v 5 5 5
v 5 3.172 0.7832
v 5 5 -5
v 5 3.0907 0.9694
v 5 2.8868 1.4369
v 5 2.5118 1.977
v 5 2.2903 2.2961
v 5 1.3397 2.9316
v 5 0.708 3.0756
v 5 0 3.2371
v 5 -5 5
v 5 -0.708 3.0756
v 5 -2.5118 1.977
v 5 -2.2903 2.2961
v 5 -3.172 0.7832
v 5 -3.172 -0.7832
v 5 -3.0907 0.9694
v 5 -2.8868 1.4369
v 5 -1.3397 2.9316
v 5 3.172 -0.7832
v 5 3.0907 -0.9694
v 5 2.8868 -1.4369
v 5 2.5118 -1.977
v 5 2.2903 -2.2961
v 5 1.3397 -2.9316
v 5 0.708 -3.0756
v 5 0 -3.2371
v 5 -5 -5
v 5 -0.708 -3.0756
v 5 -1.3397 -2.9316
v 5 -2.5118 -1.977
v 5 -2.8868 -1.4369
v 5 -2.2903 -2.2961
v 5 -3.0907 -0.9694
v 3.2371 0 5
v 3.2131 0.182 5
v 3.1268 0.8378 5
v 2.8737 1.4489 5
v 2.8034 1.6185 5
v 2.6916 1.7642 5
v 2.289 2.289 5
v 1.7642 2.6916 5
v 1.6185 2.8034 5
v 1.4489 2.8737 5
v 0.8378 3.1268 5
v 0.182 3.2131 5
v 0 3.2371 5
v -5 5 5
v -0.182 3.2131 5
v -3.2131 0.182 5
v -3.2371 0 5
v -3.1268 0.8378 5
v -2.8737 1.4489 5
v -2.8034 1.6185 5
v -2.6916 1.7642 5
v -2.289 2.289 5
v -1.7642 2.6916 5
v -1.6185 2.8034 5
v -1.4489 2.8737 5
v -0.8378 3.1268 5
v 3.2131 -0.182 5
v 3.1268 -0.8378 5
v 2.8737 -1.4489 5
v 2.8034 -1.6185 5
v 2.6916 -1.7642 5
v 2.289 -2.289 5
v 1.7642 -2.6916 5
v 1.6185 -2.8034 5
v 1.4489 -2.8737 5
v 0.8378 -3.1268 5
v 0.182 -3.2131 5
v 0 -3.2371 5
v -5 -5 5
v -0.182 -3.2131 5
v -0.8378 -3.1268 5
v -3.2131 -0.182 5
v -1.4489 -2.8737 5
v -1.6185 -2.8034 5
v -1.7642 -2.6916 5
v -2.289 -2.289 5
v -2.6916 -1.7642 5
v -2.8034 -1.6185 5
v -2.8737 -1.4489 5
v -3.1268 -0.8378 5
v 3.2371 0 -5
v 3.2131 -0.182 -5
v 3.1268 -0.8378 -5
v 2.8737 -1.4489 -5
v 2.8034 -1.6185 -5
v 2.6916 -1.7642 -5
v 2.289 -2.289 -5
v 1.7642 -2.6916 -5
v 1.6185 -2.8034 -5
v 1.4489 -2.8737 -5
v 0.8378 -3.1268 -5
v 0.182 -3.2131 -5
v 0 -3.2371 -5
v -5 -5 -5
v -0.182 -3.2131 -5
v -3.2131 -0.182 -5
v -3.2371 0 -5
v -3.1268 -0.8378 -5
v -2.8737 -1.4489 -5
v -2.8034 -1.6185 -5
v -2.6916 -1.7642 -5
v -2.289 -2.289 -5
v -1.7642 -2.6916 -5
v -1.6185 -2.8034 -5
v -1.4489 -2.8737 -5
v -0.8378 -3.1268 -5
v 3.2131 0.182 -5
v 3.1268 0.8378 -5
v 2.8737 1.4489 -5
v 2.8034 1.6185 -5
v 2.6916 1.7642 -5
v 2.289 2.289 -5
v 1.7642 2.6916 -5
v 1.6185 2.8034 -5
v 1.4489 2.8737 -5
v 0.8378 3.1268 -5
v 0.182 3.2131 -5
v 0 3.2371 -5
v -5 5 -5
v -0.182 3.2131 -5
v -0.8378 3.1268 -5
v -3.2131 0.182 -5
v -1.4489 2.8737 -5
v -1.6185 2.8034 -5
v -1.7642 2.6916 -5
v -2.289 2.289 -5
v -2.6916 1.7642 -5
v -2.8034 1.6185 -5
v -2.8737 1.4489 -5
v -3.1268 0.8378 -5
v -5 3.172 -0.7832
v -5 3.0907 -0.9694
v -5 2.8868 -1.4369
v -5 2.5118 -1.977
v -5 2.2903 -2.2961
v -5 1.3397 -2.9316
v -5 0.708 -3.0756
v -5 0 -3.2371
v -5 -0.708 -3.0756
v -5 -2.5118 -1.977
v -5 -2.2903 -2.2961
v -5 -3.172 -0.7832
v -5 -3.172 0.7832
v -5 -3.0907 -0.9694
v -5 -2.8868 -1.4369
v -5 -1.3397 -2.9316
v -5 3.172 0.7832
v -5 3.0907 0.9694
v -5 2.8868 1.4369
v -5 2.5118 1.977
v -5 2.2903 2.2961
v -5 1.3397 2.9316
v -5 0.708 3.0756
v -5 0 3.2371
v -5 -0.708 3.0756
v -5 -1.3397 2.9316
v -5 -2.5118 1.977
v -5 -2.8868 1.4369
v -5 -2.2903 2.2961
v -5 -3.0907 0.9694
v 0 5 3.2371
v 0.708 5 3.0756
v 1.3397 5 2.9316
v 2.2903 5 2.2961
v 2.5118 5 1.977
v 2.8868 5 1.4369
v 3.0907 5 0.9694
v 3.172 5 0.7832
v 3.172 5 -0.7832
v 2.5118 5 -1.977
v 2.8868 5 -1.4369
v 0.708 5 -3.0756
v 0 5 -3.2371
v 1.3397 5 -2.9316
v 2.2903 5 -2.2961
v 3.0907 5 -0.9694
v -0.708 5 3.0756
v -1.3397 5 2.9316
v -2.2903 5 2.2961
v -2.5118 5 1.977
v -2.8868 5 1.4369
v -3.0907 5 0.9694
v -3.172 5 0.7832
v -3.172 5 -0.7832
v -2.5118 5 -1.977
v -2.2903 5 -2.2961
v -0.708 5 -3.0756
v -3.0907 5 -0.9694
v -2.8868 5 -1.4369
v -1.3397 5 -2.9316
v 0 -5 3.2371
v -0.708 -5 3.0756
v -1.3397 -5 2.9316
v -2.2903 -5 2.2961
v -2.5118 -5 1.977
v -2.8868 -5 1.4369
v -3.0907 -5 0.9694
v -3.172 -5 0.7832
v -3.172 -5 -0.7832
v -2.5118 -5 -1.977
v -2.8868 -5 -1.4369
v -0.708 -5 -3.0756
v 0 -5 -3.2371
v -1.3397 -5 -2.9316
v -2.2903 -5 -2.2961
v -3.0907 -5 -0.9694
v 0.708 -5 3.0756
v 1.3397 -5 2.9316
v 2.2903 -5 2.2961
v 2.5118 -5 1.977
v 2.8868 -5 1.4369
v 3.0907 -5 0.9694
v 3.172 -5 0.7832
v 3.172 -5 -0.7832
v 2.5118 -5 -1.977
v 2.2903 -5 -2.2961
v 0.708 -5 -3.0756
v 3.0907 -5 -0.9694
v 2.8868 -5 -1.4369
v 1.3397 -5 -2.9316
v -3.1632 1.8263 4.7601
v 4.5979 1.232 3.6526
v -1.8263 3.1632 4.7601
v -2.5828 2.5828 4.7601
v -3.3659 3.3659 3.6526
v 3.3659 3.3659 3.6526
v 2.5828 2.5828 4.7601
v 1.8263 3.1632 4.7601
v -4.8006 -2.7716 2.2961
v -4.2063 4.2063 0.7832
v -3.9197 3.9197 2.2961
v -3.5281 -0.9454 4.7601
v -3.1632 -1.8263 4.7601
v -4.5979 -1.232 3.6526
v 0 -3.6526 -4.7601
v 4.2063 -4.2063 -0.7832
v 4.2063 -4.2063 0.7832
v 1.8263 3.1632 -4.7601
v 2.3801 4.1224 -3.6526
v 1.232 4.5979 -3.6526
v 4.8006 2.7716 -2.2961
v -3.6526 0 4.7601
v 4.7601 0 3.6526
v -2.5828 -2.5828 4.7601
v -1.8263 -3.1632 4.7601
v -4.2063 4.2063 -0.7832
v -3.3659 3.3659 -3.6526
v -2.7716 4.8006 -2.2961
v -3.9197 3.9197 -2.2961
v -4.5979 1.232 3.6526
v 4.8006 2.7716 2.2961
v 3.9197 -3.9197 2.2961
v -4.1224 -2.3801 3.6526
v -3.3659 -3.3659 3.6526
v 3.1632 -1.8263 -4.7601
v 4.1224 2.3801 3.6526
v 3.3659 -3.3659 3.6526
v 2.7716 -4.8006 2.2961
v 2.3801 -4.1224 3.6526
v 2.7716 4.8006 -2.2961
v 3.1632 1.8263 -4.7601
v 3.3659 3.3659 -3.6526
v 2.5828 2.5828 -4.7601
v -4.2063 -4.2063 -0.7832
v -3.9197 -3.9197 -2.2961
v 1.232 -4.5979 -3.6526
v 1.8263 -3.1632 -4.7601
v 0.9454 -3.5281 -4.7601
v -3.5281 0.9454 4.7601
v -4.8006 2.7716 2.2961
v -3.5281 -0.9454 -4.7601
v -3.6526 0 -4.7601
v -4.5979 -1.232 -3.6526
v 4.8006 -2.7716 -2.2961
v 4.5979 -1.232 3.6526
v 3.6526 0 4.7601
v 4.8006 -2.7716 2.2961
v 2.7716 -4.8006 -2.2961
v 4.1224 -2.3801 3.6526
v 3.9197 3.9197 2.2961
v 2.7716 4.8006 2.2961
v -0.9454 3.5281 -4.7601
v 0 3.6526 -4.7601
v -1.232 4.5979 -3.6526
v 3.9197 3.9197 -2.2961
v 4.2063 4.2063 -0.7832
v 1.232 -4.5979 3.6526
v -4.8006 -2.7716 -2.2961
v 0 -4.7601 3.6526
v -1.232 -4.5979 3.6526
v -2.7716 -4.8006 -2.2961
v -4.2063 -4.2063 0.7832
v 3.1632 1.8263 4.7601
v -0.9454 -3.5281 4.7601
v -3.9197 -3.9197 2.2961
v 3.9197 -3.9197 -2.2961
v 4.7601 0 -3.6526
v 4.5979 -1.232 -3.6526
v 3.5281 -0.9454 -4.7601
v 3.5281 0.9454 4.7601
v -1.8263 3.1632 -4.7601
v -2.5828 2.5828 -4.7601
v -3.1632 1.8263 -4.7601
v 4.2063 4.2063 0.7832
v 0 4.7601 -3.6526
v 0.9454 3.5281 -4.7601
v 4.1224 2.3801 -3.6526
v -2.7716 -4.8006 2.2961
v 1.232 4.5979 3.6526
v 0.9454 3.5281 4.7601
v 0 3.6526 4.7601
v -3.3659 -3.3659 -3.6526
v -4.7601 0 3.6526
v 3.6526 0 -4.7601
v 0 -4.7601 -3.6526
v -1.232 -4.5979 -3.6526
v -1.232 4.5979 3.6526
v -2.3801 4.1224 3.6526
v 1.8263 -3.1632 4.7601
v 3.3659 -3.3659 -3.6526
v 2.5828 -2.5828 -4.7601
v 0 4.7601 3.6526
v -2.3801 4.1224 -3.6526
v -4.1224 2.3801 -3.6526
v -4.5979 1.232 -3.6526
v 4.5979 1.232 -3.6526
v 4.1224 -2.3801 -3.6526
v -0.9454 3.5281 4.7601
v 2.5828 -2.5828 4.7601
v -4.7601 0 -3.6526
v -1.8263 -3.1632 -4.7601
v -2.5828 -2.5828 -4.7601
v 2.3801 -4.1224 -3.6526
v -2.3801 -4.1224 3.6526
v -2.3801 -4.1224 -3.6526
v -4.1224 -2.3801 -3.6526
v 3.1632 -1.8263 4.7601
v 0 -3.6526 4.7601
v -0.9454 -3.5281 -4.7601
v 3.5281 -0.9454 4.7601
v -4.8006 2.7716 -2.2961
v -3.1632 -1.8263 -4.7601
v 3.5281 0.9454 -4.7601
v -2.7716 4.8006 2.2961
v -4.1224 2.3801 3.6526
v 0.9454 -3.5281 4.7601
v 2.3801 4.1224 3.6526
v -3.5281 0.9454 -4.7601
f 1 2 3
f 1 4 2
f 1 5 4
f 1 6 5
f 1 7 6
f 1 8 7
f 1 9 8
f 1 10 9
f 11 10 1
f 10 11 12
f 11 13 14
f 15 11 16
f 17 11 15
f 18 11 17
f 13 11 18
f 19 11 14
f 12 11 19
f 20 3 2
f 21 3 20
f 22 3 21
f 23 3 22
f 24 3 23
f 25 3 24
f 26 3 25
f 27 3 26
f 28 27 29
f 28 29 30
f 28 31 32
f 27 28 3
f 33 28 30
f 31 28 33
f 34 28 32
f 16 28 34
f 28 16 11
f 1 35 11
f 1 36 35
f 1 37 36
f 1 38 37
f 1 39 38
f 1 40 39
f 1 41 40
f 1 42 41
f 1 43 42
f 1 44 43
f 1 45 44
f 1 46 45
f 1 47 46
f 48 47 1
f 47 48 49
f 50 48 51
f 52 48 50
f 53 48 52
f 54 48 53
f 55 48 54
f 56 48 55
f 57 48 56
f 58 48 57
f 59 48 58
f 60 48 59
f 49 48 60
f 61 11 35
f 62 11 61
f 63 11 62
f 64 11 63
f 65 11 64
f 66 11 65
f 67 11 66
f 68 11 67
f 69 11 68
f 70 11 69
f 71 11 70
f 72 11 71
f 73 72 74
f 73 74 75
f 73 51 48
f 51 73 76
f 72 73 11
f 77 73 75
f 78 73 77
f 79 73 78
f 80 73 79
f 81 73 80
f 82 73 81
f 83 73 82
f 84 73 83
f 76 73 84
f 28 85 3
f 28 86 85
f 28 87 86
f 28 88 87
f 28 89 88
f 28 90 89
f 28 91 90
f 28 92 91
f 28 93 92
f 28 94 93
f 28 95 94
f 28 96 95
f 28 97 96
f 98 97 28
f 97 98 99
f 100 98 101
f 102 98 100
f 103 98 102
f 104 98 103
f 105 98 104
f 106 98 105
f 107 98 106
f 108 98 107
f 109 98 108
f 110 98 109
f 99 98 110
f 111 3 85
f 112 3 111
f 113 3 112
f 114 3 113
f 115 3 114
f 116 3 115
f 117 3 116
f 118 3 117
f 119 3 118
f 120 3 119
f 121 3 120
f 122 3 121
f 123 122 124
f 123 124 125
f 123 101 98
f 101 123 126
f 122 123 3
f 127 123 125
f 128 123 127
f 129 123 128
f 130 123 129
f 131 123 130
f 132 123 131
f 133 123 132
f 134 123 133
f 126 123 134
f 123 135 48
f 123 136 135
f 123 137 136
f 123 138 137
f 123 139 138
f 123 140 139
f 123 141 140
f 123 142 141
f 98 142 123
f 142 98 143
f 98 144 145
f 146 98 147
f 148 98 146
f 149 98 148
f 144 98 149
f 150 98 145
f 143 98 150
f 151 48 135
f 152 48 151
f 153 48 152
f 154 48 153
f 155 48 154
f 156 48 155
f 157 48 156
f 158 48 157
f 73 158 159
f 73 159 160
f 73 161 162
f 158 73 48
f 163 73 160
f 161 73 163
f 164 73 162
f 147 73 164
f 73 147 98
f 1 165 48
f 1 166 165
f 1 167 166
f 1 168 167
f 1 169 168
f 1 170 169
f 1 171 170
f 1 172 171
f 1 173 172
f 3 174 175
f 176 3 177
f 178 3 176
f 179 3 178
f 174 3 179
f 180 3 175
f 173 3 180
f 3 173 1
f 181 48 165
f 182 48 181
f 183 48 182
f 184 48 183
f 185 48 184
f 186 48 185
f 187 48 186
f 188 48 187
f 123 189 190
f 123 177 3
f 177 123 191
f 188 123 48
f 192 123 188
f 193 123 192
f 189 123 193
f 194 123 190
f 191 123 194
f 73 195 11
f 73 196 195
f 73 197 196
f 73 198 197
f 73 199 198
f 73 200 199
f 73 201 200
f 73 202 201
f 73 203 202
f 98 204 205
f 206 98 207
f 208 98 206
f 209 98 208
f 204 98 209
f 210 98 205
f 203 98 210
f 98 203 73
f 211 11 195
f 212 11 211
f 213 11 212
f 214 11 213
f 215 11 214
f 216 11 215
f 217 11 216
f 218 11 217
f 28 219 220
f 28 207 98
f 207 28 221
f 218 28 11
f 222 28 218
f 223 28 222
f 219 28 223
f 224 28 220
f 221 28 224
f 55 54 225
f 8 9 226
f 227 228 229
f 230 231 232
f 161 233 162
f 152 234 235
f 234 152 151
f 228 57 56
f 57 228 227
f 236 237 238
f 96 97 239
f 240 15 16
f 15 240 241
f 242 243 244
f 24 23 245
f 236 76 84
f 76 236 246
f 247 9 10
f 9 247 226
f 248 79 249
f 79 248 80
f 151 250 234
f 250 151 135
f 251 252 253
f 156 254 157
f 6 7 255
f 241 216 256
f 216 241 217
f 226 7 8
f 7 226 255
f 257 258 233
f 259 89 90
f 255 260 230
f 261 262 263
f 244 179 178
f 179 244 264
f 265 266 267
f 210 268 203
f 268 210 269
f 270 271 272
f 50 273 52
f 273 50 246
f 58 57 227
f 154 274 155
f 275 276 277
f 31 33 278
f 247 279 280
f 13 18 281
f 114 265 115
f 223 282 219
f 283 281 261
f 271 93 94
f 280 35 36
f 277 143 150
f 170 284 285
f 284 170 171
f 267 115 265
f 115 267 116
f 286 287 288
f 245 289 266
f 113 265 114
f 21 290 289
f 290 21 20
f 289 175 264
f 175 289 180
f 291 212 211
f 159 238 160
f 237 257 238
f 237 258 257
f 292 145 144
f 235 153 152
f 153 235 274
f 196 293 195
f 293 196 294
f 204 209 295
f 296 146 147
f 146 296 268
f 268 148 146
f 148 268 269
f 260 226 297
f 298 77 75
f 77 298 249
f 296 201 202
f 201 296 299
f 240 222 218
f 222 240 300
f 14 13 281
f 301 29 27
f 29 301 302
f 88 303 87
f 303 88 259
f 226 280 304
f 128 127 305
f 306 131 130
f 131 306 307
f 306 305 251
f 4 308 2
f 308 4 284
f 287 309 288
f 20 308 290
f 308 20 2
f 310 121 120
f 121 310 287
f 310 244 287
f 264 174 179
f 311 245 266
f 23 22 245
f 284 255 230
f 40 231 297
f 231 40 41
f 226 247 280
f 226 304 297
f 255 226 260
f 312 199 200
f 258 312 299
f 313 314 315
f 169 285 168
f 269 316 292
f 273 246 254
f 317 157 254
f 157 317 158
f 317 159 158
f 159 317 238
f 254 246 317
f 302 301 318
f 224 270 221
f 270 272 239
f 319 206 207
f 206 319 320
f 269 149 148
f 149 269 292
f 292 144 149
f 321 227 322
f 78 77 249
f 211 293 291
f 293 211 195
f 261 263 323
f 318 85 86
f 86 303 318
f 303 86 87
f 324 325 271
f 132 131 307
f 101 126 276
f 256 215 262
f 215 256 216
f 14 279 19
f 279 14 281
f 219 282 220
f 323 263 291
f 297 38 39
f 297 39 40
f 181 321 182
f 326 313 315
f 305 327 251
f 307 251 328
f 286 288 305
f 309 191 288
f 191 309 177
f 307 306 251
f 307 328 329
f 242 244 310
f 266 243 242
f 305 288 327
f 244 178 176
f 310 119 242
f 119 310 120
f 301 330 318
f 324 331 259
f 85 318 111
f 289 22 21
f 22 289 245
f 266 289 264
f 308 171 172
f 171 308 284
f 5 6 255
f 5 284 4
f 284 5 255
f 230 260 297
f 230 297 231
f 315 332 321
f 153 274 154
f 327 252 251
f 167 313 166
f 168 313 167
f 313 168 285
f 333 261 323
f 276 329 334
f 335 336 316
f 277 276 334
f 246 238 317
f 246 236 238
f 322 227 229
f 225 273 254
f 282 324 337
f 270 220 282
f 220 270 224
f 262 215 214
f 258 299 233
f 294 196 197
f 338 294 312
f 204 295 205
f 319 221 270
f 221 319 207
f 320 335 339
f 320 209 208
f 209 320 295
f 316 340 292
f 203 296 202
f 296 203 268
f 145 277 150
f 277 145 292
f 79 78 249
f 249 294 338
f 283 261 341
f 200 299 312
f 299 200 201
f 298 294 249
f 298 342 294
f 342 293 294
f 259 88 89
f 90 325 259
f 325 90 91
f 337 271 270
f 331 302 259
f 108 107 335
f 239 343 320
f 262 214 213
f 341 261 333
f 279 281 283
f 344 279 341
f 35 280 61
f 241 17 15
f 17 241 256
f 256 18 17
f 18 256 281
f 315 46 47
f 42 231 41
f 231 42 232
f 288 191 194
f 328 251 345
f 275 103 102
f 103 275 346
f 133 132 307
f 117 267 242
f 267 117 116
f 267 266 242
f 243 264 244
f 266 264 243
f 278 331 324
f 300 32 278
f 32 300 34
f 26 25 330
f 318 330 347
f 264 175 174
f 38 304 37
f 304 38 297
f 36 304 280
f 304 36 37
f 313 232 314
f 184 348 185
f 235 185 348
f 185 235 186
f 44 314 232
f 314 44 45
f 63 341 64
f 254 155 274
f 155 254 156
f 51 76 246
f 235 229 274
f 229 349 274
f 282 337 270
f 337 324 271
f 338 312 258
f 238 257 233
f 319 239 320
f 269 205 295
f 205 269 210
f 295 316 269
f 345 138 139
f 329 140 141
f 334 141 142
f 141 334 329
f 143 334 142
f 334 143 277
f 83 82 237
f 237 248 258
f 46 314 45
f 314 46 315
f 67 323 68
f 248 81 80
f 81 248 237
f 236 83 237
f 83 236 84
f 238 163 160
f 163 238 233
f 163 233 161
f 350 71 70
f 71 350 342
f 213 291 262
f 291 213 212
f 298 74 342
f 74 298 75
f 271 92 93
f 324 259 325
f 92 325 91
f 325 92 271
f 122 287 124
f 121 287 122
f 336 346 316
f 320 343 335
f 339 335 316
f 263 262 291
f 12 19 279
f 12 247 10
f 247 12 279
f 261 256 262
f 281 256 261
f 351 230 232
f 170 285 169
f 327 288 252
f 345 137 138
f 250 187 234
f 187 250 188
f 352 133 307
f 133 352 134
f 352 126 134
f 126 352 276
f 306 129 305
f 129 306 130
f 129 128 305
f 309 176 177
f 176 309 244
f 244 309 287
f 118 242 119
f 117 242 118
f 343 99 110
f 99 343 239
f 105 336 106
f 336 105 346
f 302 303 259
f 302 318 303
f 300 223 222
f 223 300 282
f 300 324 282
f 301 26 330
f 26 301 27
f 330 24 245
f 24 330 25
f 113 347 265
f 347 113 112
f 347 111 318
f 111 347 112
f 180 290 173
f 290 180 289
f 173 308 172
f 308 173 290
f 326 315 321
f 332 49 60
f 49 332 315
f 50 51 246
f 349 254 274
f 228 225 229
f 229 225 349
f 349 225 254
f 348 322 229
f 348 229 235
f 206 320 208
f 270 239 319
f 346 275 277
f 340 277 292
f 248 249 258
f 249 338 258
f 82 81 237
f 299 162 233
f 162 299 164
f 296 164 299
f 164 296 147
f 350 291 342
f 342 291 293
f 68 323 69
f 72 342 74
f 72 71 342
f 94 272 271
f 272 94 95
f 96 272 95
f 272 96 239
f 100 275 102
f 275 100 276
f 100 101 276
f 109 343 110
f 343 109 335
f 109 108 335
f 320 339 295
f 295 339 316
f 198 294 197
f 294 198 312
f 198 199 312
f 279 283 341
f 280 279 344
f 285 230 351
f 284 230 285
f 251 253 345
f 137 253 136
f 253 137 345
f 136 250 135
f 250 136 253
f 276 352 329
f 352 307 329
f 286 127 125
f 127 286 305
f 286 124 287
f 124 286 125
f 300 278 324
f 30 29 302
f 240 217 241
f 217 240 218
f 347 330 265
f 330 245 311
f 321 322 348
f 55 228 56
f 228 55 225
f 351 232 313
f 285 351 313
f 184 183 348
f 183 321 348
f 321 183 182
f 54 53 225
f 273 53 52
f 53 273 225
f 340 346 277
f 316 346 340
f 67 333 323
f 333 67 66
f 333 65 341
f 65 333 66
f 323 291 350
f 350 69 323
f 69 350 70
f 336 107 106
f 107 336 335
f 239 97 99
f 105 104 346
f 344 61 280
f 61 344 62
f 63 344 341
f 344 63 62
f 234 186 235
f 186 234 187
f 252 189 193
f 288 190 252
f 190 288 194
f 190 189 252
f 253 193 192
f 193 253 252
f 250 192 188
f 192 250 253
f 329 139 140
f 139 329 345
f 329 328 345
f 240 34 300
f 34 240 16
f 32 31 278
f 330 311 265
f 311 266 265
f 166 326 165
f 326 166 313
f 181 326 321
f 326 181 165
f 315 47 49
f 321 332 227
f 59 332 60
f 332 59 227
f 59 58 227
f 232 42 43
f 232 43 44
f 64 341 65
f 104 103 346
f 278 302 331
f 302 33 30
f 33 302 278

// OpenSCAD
difference() {
  color("red") cube(10, center = true);
  color("blue") sphere(r = 6, $fn = 24);
}
